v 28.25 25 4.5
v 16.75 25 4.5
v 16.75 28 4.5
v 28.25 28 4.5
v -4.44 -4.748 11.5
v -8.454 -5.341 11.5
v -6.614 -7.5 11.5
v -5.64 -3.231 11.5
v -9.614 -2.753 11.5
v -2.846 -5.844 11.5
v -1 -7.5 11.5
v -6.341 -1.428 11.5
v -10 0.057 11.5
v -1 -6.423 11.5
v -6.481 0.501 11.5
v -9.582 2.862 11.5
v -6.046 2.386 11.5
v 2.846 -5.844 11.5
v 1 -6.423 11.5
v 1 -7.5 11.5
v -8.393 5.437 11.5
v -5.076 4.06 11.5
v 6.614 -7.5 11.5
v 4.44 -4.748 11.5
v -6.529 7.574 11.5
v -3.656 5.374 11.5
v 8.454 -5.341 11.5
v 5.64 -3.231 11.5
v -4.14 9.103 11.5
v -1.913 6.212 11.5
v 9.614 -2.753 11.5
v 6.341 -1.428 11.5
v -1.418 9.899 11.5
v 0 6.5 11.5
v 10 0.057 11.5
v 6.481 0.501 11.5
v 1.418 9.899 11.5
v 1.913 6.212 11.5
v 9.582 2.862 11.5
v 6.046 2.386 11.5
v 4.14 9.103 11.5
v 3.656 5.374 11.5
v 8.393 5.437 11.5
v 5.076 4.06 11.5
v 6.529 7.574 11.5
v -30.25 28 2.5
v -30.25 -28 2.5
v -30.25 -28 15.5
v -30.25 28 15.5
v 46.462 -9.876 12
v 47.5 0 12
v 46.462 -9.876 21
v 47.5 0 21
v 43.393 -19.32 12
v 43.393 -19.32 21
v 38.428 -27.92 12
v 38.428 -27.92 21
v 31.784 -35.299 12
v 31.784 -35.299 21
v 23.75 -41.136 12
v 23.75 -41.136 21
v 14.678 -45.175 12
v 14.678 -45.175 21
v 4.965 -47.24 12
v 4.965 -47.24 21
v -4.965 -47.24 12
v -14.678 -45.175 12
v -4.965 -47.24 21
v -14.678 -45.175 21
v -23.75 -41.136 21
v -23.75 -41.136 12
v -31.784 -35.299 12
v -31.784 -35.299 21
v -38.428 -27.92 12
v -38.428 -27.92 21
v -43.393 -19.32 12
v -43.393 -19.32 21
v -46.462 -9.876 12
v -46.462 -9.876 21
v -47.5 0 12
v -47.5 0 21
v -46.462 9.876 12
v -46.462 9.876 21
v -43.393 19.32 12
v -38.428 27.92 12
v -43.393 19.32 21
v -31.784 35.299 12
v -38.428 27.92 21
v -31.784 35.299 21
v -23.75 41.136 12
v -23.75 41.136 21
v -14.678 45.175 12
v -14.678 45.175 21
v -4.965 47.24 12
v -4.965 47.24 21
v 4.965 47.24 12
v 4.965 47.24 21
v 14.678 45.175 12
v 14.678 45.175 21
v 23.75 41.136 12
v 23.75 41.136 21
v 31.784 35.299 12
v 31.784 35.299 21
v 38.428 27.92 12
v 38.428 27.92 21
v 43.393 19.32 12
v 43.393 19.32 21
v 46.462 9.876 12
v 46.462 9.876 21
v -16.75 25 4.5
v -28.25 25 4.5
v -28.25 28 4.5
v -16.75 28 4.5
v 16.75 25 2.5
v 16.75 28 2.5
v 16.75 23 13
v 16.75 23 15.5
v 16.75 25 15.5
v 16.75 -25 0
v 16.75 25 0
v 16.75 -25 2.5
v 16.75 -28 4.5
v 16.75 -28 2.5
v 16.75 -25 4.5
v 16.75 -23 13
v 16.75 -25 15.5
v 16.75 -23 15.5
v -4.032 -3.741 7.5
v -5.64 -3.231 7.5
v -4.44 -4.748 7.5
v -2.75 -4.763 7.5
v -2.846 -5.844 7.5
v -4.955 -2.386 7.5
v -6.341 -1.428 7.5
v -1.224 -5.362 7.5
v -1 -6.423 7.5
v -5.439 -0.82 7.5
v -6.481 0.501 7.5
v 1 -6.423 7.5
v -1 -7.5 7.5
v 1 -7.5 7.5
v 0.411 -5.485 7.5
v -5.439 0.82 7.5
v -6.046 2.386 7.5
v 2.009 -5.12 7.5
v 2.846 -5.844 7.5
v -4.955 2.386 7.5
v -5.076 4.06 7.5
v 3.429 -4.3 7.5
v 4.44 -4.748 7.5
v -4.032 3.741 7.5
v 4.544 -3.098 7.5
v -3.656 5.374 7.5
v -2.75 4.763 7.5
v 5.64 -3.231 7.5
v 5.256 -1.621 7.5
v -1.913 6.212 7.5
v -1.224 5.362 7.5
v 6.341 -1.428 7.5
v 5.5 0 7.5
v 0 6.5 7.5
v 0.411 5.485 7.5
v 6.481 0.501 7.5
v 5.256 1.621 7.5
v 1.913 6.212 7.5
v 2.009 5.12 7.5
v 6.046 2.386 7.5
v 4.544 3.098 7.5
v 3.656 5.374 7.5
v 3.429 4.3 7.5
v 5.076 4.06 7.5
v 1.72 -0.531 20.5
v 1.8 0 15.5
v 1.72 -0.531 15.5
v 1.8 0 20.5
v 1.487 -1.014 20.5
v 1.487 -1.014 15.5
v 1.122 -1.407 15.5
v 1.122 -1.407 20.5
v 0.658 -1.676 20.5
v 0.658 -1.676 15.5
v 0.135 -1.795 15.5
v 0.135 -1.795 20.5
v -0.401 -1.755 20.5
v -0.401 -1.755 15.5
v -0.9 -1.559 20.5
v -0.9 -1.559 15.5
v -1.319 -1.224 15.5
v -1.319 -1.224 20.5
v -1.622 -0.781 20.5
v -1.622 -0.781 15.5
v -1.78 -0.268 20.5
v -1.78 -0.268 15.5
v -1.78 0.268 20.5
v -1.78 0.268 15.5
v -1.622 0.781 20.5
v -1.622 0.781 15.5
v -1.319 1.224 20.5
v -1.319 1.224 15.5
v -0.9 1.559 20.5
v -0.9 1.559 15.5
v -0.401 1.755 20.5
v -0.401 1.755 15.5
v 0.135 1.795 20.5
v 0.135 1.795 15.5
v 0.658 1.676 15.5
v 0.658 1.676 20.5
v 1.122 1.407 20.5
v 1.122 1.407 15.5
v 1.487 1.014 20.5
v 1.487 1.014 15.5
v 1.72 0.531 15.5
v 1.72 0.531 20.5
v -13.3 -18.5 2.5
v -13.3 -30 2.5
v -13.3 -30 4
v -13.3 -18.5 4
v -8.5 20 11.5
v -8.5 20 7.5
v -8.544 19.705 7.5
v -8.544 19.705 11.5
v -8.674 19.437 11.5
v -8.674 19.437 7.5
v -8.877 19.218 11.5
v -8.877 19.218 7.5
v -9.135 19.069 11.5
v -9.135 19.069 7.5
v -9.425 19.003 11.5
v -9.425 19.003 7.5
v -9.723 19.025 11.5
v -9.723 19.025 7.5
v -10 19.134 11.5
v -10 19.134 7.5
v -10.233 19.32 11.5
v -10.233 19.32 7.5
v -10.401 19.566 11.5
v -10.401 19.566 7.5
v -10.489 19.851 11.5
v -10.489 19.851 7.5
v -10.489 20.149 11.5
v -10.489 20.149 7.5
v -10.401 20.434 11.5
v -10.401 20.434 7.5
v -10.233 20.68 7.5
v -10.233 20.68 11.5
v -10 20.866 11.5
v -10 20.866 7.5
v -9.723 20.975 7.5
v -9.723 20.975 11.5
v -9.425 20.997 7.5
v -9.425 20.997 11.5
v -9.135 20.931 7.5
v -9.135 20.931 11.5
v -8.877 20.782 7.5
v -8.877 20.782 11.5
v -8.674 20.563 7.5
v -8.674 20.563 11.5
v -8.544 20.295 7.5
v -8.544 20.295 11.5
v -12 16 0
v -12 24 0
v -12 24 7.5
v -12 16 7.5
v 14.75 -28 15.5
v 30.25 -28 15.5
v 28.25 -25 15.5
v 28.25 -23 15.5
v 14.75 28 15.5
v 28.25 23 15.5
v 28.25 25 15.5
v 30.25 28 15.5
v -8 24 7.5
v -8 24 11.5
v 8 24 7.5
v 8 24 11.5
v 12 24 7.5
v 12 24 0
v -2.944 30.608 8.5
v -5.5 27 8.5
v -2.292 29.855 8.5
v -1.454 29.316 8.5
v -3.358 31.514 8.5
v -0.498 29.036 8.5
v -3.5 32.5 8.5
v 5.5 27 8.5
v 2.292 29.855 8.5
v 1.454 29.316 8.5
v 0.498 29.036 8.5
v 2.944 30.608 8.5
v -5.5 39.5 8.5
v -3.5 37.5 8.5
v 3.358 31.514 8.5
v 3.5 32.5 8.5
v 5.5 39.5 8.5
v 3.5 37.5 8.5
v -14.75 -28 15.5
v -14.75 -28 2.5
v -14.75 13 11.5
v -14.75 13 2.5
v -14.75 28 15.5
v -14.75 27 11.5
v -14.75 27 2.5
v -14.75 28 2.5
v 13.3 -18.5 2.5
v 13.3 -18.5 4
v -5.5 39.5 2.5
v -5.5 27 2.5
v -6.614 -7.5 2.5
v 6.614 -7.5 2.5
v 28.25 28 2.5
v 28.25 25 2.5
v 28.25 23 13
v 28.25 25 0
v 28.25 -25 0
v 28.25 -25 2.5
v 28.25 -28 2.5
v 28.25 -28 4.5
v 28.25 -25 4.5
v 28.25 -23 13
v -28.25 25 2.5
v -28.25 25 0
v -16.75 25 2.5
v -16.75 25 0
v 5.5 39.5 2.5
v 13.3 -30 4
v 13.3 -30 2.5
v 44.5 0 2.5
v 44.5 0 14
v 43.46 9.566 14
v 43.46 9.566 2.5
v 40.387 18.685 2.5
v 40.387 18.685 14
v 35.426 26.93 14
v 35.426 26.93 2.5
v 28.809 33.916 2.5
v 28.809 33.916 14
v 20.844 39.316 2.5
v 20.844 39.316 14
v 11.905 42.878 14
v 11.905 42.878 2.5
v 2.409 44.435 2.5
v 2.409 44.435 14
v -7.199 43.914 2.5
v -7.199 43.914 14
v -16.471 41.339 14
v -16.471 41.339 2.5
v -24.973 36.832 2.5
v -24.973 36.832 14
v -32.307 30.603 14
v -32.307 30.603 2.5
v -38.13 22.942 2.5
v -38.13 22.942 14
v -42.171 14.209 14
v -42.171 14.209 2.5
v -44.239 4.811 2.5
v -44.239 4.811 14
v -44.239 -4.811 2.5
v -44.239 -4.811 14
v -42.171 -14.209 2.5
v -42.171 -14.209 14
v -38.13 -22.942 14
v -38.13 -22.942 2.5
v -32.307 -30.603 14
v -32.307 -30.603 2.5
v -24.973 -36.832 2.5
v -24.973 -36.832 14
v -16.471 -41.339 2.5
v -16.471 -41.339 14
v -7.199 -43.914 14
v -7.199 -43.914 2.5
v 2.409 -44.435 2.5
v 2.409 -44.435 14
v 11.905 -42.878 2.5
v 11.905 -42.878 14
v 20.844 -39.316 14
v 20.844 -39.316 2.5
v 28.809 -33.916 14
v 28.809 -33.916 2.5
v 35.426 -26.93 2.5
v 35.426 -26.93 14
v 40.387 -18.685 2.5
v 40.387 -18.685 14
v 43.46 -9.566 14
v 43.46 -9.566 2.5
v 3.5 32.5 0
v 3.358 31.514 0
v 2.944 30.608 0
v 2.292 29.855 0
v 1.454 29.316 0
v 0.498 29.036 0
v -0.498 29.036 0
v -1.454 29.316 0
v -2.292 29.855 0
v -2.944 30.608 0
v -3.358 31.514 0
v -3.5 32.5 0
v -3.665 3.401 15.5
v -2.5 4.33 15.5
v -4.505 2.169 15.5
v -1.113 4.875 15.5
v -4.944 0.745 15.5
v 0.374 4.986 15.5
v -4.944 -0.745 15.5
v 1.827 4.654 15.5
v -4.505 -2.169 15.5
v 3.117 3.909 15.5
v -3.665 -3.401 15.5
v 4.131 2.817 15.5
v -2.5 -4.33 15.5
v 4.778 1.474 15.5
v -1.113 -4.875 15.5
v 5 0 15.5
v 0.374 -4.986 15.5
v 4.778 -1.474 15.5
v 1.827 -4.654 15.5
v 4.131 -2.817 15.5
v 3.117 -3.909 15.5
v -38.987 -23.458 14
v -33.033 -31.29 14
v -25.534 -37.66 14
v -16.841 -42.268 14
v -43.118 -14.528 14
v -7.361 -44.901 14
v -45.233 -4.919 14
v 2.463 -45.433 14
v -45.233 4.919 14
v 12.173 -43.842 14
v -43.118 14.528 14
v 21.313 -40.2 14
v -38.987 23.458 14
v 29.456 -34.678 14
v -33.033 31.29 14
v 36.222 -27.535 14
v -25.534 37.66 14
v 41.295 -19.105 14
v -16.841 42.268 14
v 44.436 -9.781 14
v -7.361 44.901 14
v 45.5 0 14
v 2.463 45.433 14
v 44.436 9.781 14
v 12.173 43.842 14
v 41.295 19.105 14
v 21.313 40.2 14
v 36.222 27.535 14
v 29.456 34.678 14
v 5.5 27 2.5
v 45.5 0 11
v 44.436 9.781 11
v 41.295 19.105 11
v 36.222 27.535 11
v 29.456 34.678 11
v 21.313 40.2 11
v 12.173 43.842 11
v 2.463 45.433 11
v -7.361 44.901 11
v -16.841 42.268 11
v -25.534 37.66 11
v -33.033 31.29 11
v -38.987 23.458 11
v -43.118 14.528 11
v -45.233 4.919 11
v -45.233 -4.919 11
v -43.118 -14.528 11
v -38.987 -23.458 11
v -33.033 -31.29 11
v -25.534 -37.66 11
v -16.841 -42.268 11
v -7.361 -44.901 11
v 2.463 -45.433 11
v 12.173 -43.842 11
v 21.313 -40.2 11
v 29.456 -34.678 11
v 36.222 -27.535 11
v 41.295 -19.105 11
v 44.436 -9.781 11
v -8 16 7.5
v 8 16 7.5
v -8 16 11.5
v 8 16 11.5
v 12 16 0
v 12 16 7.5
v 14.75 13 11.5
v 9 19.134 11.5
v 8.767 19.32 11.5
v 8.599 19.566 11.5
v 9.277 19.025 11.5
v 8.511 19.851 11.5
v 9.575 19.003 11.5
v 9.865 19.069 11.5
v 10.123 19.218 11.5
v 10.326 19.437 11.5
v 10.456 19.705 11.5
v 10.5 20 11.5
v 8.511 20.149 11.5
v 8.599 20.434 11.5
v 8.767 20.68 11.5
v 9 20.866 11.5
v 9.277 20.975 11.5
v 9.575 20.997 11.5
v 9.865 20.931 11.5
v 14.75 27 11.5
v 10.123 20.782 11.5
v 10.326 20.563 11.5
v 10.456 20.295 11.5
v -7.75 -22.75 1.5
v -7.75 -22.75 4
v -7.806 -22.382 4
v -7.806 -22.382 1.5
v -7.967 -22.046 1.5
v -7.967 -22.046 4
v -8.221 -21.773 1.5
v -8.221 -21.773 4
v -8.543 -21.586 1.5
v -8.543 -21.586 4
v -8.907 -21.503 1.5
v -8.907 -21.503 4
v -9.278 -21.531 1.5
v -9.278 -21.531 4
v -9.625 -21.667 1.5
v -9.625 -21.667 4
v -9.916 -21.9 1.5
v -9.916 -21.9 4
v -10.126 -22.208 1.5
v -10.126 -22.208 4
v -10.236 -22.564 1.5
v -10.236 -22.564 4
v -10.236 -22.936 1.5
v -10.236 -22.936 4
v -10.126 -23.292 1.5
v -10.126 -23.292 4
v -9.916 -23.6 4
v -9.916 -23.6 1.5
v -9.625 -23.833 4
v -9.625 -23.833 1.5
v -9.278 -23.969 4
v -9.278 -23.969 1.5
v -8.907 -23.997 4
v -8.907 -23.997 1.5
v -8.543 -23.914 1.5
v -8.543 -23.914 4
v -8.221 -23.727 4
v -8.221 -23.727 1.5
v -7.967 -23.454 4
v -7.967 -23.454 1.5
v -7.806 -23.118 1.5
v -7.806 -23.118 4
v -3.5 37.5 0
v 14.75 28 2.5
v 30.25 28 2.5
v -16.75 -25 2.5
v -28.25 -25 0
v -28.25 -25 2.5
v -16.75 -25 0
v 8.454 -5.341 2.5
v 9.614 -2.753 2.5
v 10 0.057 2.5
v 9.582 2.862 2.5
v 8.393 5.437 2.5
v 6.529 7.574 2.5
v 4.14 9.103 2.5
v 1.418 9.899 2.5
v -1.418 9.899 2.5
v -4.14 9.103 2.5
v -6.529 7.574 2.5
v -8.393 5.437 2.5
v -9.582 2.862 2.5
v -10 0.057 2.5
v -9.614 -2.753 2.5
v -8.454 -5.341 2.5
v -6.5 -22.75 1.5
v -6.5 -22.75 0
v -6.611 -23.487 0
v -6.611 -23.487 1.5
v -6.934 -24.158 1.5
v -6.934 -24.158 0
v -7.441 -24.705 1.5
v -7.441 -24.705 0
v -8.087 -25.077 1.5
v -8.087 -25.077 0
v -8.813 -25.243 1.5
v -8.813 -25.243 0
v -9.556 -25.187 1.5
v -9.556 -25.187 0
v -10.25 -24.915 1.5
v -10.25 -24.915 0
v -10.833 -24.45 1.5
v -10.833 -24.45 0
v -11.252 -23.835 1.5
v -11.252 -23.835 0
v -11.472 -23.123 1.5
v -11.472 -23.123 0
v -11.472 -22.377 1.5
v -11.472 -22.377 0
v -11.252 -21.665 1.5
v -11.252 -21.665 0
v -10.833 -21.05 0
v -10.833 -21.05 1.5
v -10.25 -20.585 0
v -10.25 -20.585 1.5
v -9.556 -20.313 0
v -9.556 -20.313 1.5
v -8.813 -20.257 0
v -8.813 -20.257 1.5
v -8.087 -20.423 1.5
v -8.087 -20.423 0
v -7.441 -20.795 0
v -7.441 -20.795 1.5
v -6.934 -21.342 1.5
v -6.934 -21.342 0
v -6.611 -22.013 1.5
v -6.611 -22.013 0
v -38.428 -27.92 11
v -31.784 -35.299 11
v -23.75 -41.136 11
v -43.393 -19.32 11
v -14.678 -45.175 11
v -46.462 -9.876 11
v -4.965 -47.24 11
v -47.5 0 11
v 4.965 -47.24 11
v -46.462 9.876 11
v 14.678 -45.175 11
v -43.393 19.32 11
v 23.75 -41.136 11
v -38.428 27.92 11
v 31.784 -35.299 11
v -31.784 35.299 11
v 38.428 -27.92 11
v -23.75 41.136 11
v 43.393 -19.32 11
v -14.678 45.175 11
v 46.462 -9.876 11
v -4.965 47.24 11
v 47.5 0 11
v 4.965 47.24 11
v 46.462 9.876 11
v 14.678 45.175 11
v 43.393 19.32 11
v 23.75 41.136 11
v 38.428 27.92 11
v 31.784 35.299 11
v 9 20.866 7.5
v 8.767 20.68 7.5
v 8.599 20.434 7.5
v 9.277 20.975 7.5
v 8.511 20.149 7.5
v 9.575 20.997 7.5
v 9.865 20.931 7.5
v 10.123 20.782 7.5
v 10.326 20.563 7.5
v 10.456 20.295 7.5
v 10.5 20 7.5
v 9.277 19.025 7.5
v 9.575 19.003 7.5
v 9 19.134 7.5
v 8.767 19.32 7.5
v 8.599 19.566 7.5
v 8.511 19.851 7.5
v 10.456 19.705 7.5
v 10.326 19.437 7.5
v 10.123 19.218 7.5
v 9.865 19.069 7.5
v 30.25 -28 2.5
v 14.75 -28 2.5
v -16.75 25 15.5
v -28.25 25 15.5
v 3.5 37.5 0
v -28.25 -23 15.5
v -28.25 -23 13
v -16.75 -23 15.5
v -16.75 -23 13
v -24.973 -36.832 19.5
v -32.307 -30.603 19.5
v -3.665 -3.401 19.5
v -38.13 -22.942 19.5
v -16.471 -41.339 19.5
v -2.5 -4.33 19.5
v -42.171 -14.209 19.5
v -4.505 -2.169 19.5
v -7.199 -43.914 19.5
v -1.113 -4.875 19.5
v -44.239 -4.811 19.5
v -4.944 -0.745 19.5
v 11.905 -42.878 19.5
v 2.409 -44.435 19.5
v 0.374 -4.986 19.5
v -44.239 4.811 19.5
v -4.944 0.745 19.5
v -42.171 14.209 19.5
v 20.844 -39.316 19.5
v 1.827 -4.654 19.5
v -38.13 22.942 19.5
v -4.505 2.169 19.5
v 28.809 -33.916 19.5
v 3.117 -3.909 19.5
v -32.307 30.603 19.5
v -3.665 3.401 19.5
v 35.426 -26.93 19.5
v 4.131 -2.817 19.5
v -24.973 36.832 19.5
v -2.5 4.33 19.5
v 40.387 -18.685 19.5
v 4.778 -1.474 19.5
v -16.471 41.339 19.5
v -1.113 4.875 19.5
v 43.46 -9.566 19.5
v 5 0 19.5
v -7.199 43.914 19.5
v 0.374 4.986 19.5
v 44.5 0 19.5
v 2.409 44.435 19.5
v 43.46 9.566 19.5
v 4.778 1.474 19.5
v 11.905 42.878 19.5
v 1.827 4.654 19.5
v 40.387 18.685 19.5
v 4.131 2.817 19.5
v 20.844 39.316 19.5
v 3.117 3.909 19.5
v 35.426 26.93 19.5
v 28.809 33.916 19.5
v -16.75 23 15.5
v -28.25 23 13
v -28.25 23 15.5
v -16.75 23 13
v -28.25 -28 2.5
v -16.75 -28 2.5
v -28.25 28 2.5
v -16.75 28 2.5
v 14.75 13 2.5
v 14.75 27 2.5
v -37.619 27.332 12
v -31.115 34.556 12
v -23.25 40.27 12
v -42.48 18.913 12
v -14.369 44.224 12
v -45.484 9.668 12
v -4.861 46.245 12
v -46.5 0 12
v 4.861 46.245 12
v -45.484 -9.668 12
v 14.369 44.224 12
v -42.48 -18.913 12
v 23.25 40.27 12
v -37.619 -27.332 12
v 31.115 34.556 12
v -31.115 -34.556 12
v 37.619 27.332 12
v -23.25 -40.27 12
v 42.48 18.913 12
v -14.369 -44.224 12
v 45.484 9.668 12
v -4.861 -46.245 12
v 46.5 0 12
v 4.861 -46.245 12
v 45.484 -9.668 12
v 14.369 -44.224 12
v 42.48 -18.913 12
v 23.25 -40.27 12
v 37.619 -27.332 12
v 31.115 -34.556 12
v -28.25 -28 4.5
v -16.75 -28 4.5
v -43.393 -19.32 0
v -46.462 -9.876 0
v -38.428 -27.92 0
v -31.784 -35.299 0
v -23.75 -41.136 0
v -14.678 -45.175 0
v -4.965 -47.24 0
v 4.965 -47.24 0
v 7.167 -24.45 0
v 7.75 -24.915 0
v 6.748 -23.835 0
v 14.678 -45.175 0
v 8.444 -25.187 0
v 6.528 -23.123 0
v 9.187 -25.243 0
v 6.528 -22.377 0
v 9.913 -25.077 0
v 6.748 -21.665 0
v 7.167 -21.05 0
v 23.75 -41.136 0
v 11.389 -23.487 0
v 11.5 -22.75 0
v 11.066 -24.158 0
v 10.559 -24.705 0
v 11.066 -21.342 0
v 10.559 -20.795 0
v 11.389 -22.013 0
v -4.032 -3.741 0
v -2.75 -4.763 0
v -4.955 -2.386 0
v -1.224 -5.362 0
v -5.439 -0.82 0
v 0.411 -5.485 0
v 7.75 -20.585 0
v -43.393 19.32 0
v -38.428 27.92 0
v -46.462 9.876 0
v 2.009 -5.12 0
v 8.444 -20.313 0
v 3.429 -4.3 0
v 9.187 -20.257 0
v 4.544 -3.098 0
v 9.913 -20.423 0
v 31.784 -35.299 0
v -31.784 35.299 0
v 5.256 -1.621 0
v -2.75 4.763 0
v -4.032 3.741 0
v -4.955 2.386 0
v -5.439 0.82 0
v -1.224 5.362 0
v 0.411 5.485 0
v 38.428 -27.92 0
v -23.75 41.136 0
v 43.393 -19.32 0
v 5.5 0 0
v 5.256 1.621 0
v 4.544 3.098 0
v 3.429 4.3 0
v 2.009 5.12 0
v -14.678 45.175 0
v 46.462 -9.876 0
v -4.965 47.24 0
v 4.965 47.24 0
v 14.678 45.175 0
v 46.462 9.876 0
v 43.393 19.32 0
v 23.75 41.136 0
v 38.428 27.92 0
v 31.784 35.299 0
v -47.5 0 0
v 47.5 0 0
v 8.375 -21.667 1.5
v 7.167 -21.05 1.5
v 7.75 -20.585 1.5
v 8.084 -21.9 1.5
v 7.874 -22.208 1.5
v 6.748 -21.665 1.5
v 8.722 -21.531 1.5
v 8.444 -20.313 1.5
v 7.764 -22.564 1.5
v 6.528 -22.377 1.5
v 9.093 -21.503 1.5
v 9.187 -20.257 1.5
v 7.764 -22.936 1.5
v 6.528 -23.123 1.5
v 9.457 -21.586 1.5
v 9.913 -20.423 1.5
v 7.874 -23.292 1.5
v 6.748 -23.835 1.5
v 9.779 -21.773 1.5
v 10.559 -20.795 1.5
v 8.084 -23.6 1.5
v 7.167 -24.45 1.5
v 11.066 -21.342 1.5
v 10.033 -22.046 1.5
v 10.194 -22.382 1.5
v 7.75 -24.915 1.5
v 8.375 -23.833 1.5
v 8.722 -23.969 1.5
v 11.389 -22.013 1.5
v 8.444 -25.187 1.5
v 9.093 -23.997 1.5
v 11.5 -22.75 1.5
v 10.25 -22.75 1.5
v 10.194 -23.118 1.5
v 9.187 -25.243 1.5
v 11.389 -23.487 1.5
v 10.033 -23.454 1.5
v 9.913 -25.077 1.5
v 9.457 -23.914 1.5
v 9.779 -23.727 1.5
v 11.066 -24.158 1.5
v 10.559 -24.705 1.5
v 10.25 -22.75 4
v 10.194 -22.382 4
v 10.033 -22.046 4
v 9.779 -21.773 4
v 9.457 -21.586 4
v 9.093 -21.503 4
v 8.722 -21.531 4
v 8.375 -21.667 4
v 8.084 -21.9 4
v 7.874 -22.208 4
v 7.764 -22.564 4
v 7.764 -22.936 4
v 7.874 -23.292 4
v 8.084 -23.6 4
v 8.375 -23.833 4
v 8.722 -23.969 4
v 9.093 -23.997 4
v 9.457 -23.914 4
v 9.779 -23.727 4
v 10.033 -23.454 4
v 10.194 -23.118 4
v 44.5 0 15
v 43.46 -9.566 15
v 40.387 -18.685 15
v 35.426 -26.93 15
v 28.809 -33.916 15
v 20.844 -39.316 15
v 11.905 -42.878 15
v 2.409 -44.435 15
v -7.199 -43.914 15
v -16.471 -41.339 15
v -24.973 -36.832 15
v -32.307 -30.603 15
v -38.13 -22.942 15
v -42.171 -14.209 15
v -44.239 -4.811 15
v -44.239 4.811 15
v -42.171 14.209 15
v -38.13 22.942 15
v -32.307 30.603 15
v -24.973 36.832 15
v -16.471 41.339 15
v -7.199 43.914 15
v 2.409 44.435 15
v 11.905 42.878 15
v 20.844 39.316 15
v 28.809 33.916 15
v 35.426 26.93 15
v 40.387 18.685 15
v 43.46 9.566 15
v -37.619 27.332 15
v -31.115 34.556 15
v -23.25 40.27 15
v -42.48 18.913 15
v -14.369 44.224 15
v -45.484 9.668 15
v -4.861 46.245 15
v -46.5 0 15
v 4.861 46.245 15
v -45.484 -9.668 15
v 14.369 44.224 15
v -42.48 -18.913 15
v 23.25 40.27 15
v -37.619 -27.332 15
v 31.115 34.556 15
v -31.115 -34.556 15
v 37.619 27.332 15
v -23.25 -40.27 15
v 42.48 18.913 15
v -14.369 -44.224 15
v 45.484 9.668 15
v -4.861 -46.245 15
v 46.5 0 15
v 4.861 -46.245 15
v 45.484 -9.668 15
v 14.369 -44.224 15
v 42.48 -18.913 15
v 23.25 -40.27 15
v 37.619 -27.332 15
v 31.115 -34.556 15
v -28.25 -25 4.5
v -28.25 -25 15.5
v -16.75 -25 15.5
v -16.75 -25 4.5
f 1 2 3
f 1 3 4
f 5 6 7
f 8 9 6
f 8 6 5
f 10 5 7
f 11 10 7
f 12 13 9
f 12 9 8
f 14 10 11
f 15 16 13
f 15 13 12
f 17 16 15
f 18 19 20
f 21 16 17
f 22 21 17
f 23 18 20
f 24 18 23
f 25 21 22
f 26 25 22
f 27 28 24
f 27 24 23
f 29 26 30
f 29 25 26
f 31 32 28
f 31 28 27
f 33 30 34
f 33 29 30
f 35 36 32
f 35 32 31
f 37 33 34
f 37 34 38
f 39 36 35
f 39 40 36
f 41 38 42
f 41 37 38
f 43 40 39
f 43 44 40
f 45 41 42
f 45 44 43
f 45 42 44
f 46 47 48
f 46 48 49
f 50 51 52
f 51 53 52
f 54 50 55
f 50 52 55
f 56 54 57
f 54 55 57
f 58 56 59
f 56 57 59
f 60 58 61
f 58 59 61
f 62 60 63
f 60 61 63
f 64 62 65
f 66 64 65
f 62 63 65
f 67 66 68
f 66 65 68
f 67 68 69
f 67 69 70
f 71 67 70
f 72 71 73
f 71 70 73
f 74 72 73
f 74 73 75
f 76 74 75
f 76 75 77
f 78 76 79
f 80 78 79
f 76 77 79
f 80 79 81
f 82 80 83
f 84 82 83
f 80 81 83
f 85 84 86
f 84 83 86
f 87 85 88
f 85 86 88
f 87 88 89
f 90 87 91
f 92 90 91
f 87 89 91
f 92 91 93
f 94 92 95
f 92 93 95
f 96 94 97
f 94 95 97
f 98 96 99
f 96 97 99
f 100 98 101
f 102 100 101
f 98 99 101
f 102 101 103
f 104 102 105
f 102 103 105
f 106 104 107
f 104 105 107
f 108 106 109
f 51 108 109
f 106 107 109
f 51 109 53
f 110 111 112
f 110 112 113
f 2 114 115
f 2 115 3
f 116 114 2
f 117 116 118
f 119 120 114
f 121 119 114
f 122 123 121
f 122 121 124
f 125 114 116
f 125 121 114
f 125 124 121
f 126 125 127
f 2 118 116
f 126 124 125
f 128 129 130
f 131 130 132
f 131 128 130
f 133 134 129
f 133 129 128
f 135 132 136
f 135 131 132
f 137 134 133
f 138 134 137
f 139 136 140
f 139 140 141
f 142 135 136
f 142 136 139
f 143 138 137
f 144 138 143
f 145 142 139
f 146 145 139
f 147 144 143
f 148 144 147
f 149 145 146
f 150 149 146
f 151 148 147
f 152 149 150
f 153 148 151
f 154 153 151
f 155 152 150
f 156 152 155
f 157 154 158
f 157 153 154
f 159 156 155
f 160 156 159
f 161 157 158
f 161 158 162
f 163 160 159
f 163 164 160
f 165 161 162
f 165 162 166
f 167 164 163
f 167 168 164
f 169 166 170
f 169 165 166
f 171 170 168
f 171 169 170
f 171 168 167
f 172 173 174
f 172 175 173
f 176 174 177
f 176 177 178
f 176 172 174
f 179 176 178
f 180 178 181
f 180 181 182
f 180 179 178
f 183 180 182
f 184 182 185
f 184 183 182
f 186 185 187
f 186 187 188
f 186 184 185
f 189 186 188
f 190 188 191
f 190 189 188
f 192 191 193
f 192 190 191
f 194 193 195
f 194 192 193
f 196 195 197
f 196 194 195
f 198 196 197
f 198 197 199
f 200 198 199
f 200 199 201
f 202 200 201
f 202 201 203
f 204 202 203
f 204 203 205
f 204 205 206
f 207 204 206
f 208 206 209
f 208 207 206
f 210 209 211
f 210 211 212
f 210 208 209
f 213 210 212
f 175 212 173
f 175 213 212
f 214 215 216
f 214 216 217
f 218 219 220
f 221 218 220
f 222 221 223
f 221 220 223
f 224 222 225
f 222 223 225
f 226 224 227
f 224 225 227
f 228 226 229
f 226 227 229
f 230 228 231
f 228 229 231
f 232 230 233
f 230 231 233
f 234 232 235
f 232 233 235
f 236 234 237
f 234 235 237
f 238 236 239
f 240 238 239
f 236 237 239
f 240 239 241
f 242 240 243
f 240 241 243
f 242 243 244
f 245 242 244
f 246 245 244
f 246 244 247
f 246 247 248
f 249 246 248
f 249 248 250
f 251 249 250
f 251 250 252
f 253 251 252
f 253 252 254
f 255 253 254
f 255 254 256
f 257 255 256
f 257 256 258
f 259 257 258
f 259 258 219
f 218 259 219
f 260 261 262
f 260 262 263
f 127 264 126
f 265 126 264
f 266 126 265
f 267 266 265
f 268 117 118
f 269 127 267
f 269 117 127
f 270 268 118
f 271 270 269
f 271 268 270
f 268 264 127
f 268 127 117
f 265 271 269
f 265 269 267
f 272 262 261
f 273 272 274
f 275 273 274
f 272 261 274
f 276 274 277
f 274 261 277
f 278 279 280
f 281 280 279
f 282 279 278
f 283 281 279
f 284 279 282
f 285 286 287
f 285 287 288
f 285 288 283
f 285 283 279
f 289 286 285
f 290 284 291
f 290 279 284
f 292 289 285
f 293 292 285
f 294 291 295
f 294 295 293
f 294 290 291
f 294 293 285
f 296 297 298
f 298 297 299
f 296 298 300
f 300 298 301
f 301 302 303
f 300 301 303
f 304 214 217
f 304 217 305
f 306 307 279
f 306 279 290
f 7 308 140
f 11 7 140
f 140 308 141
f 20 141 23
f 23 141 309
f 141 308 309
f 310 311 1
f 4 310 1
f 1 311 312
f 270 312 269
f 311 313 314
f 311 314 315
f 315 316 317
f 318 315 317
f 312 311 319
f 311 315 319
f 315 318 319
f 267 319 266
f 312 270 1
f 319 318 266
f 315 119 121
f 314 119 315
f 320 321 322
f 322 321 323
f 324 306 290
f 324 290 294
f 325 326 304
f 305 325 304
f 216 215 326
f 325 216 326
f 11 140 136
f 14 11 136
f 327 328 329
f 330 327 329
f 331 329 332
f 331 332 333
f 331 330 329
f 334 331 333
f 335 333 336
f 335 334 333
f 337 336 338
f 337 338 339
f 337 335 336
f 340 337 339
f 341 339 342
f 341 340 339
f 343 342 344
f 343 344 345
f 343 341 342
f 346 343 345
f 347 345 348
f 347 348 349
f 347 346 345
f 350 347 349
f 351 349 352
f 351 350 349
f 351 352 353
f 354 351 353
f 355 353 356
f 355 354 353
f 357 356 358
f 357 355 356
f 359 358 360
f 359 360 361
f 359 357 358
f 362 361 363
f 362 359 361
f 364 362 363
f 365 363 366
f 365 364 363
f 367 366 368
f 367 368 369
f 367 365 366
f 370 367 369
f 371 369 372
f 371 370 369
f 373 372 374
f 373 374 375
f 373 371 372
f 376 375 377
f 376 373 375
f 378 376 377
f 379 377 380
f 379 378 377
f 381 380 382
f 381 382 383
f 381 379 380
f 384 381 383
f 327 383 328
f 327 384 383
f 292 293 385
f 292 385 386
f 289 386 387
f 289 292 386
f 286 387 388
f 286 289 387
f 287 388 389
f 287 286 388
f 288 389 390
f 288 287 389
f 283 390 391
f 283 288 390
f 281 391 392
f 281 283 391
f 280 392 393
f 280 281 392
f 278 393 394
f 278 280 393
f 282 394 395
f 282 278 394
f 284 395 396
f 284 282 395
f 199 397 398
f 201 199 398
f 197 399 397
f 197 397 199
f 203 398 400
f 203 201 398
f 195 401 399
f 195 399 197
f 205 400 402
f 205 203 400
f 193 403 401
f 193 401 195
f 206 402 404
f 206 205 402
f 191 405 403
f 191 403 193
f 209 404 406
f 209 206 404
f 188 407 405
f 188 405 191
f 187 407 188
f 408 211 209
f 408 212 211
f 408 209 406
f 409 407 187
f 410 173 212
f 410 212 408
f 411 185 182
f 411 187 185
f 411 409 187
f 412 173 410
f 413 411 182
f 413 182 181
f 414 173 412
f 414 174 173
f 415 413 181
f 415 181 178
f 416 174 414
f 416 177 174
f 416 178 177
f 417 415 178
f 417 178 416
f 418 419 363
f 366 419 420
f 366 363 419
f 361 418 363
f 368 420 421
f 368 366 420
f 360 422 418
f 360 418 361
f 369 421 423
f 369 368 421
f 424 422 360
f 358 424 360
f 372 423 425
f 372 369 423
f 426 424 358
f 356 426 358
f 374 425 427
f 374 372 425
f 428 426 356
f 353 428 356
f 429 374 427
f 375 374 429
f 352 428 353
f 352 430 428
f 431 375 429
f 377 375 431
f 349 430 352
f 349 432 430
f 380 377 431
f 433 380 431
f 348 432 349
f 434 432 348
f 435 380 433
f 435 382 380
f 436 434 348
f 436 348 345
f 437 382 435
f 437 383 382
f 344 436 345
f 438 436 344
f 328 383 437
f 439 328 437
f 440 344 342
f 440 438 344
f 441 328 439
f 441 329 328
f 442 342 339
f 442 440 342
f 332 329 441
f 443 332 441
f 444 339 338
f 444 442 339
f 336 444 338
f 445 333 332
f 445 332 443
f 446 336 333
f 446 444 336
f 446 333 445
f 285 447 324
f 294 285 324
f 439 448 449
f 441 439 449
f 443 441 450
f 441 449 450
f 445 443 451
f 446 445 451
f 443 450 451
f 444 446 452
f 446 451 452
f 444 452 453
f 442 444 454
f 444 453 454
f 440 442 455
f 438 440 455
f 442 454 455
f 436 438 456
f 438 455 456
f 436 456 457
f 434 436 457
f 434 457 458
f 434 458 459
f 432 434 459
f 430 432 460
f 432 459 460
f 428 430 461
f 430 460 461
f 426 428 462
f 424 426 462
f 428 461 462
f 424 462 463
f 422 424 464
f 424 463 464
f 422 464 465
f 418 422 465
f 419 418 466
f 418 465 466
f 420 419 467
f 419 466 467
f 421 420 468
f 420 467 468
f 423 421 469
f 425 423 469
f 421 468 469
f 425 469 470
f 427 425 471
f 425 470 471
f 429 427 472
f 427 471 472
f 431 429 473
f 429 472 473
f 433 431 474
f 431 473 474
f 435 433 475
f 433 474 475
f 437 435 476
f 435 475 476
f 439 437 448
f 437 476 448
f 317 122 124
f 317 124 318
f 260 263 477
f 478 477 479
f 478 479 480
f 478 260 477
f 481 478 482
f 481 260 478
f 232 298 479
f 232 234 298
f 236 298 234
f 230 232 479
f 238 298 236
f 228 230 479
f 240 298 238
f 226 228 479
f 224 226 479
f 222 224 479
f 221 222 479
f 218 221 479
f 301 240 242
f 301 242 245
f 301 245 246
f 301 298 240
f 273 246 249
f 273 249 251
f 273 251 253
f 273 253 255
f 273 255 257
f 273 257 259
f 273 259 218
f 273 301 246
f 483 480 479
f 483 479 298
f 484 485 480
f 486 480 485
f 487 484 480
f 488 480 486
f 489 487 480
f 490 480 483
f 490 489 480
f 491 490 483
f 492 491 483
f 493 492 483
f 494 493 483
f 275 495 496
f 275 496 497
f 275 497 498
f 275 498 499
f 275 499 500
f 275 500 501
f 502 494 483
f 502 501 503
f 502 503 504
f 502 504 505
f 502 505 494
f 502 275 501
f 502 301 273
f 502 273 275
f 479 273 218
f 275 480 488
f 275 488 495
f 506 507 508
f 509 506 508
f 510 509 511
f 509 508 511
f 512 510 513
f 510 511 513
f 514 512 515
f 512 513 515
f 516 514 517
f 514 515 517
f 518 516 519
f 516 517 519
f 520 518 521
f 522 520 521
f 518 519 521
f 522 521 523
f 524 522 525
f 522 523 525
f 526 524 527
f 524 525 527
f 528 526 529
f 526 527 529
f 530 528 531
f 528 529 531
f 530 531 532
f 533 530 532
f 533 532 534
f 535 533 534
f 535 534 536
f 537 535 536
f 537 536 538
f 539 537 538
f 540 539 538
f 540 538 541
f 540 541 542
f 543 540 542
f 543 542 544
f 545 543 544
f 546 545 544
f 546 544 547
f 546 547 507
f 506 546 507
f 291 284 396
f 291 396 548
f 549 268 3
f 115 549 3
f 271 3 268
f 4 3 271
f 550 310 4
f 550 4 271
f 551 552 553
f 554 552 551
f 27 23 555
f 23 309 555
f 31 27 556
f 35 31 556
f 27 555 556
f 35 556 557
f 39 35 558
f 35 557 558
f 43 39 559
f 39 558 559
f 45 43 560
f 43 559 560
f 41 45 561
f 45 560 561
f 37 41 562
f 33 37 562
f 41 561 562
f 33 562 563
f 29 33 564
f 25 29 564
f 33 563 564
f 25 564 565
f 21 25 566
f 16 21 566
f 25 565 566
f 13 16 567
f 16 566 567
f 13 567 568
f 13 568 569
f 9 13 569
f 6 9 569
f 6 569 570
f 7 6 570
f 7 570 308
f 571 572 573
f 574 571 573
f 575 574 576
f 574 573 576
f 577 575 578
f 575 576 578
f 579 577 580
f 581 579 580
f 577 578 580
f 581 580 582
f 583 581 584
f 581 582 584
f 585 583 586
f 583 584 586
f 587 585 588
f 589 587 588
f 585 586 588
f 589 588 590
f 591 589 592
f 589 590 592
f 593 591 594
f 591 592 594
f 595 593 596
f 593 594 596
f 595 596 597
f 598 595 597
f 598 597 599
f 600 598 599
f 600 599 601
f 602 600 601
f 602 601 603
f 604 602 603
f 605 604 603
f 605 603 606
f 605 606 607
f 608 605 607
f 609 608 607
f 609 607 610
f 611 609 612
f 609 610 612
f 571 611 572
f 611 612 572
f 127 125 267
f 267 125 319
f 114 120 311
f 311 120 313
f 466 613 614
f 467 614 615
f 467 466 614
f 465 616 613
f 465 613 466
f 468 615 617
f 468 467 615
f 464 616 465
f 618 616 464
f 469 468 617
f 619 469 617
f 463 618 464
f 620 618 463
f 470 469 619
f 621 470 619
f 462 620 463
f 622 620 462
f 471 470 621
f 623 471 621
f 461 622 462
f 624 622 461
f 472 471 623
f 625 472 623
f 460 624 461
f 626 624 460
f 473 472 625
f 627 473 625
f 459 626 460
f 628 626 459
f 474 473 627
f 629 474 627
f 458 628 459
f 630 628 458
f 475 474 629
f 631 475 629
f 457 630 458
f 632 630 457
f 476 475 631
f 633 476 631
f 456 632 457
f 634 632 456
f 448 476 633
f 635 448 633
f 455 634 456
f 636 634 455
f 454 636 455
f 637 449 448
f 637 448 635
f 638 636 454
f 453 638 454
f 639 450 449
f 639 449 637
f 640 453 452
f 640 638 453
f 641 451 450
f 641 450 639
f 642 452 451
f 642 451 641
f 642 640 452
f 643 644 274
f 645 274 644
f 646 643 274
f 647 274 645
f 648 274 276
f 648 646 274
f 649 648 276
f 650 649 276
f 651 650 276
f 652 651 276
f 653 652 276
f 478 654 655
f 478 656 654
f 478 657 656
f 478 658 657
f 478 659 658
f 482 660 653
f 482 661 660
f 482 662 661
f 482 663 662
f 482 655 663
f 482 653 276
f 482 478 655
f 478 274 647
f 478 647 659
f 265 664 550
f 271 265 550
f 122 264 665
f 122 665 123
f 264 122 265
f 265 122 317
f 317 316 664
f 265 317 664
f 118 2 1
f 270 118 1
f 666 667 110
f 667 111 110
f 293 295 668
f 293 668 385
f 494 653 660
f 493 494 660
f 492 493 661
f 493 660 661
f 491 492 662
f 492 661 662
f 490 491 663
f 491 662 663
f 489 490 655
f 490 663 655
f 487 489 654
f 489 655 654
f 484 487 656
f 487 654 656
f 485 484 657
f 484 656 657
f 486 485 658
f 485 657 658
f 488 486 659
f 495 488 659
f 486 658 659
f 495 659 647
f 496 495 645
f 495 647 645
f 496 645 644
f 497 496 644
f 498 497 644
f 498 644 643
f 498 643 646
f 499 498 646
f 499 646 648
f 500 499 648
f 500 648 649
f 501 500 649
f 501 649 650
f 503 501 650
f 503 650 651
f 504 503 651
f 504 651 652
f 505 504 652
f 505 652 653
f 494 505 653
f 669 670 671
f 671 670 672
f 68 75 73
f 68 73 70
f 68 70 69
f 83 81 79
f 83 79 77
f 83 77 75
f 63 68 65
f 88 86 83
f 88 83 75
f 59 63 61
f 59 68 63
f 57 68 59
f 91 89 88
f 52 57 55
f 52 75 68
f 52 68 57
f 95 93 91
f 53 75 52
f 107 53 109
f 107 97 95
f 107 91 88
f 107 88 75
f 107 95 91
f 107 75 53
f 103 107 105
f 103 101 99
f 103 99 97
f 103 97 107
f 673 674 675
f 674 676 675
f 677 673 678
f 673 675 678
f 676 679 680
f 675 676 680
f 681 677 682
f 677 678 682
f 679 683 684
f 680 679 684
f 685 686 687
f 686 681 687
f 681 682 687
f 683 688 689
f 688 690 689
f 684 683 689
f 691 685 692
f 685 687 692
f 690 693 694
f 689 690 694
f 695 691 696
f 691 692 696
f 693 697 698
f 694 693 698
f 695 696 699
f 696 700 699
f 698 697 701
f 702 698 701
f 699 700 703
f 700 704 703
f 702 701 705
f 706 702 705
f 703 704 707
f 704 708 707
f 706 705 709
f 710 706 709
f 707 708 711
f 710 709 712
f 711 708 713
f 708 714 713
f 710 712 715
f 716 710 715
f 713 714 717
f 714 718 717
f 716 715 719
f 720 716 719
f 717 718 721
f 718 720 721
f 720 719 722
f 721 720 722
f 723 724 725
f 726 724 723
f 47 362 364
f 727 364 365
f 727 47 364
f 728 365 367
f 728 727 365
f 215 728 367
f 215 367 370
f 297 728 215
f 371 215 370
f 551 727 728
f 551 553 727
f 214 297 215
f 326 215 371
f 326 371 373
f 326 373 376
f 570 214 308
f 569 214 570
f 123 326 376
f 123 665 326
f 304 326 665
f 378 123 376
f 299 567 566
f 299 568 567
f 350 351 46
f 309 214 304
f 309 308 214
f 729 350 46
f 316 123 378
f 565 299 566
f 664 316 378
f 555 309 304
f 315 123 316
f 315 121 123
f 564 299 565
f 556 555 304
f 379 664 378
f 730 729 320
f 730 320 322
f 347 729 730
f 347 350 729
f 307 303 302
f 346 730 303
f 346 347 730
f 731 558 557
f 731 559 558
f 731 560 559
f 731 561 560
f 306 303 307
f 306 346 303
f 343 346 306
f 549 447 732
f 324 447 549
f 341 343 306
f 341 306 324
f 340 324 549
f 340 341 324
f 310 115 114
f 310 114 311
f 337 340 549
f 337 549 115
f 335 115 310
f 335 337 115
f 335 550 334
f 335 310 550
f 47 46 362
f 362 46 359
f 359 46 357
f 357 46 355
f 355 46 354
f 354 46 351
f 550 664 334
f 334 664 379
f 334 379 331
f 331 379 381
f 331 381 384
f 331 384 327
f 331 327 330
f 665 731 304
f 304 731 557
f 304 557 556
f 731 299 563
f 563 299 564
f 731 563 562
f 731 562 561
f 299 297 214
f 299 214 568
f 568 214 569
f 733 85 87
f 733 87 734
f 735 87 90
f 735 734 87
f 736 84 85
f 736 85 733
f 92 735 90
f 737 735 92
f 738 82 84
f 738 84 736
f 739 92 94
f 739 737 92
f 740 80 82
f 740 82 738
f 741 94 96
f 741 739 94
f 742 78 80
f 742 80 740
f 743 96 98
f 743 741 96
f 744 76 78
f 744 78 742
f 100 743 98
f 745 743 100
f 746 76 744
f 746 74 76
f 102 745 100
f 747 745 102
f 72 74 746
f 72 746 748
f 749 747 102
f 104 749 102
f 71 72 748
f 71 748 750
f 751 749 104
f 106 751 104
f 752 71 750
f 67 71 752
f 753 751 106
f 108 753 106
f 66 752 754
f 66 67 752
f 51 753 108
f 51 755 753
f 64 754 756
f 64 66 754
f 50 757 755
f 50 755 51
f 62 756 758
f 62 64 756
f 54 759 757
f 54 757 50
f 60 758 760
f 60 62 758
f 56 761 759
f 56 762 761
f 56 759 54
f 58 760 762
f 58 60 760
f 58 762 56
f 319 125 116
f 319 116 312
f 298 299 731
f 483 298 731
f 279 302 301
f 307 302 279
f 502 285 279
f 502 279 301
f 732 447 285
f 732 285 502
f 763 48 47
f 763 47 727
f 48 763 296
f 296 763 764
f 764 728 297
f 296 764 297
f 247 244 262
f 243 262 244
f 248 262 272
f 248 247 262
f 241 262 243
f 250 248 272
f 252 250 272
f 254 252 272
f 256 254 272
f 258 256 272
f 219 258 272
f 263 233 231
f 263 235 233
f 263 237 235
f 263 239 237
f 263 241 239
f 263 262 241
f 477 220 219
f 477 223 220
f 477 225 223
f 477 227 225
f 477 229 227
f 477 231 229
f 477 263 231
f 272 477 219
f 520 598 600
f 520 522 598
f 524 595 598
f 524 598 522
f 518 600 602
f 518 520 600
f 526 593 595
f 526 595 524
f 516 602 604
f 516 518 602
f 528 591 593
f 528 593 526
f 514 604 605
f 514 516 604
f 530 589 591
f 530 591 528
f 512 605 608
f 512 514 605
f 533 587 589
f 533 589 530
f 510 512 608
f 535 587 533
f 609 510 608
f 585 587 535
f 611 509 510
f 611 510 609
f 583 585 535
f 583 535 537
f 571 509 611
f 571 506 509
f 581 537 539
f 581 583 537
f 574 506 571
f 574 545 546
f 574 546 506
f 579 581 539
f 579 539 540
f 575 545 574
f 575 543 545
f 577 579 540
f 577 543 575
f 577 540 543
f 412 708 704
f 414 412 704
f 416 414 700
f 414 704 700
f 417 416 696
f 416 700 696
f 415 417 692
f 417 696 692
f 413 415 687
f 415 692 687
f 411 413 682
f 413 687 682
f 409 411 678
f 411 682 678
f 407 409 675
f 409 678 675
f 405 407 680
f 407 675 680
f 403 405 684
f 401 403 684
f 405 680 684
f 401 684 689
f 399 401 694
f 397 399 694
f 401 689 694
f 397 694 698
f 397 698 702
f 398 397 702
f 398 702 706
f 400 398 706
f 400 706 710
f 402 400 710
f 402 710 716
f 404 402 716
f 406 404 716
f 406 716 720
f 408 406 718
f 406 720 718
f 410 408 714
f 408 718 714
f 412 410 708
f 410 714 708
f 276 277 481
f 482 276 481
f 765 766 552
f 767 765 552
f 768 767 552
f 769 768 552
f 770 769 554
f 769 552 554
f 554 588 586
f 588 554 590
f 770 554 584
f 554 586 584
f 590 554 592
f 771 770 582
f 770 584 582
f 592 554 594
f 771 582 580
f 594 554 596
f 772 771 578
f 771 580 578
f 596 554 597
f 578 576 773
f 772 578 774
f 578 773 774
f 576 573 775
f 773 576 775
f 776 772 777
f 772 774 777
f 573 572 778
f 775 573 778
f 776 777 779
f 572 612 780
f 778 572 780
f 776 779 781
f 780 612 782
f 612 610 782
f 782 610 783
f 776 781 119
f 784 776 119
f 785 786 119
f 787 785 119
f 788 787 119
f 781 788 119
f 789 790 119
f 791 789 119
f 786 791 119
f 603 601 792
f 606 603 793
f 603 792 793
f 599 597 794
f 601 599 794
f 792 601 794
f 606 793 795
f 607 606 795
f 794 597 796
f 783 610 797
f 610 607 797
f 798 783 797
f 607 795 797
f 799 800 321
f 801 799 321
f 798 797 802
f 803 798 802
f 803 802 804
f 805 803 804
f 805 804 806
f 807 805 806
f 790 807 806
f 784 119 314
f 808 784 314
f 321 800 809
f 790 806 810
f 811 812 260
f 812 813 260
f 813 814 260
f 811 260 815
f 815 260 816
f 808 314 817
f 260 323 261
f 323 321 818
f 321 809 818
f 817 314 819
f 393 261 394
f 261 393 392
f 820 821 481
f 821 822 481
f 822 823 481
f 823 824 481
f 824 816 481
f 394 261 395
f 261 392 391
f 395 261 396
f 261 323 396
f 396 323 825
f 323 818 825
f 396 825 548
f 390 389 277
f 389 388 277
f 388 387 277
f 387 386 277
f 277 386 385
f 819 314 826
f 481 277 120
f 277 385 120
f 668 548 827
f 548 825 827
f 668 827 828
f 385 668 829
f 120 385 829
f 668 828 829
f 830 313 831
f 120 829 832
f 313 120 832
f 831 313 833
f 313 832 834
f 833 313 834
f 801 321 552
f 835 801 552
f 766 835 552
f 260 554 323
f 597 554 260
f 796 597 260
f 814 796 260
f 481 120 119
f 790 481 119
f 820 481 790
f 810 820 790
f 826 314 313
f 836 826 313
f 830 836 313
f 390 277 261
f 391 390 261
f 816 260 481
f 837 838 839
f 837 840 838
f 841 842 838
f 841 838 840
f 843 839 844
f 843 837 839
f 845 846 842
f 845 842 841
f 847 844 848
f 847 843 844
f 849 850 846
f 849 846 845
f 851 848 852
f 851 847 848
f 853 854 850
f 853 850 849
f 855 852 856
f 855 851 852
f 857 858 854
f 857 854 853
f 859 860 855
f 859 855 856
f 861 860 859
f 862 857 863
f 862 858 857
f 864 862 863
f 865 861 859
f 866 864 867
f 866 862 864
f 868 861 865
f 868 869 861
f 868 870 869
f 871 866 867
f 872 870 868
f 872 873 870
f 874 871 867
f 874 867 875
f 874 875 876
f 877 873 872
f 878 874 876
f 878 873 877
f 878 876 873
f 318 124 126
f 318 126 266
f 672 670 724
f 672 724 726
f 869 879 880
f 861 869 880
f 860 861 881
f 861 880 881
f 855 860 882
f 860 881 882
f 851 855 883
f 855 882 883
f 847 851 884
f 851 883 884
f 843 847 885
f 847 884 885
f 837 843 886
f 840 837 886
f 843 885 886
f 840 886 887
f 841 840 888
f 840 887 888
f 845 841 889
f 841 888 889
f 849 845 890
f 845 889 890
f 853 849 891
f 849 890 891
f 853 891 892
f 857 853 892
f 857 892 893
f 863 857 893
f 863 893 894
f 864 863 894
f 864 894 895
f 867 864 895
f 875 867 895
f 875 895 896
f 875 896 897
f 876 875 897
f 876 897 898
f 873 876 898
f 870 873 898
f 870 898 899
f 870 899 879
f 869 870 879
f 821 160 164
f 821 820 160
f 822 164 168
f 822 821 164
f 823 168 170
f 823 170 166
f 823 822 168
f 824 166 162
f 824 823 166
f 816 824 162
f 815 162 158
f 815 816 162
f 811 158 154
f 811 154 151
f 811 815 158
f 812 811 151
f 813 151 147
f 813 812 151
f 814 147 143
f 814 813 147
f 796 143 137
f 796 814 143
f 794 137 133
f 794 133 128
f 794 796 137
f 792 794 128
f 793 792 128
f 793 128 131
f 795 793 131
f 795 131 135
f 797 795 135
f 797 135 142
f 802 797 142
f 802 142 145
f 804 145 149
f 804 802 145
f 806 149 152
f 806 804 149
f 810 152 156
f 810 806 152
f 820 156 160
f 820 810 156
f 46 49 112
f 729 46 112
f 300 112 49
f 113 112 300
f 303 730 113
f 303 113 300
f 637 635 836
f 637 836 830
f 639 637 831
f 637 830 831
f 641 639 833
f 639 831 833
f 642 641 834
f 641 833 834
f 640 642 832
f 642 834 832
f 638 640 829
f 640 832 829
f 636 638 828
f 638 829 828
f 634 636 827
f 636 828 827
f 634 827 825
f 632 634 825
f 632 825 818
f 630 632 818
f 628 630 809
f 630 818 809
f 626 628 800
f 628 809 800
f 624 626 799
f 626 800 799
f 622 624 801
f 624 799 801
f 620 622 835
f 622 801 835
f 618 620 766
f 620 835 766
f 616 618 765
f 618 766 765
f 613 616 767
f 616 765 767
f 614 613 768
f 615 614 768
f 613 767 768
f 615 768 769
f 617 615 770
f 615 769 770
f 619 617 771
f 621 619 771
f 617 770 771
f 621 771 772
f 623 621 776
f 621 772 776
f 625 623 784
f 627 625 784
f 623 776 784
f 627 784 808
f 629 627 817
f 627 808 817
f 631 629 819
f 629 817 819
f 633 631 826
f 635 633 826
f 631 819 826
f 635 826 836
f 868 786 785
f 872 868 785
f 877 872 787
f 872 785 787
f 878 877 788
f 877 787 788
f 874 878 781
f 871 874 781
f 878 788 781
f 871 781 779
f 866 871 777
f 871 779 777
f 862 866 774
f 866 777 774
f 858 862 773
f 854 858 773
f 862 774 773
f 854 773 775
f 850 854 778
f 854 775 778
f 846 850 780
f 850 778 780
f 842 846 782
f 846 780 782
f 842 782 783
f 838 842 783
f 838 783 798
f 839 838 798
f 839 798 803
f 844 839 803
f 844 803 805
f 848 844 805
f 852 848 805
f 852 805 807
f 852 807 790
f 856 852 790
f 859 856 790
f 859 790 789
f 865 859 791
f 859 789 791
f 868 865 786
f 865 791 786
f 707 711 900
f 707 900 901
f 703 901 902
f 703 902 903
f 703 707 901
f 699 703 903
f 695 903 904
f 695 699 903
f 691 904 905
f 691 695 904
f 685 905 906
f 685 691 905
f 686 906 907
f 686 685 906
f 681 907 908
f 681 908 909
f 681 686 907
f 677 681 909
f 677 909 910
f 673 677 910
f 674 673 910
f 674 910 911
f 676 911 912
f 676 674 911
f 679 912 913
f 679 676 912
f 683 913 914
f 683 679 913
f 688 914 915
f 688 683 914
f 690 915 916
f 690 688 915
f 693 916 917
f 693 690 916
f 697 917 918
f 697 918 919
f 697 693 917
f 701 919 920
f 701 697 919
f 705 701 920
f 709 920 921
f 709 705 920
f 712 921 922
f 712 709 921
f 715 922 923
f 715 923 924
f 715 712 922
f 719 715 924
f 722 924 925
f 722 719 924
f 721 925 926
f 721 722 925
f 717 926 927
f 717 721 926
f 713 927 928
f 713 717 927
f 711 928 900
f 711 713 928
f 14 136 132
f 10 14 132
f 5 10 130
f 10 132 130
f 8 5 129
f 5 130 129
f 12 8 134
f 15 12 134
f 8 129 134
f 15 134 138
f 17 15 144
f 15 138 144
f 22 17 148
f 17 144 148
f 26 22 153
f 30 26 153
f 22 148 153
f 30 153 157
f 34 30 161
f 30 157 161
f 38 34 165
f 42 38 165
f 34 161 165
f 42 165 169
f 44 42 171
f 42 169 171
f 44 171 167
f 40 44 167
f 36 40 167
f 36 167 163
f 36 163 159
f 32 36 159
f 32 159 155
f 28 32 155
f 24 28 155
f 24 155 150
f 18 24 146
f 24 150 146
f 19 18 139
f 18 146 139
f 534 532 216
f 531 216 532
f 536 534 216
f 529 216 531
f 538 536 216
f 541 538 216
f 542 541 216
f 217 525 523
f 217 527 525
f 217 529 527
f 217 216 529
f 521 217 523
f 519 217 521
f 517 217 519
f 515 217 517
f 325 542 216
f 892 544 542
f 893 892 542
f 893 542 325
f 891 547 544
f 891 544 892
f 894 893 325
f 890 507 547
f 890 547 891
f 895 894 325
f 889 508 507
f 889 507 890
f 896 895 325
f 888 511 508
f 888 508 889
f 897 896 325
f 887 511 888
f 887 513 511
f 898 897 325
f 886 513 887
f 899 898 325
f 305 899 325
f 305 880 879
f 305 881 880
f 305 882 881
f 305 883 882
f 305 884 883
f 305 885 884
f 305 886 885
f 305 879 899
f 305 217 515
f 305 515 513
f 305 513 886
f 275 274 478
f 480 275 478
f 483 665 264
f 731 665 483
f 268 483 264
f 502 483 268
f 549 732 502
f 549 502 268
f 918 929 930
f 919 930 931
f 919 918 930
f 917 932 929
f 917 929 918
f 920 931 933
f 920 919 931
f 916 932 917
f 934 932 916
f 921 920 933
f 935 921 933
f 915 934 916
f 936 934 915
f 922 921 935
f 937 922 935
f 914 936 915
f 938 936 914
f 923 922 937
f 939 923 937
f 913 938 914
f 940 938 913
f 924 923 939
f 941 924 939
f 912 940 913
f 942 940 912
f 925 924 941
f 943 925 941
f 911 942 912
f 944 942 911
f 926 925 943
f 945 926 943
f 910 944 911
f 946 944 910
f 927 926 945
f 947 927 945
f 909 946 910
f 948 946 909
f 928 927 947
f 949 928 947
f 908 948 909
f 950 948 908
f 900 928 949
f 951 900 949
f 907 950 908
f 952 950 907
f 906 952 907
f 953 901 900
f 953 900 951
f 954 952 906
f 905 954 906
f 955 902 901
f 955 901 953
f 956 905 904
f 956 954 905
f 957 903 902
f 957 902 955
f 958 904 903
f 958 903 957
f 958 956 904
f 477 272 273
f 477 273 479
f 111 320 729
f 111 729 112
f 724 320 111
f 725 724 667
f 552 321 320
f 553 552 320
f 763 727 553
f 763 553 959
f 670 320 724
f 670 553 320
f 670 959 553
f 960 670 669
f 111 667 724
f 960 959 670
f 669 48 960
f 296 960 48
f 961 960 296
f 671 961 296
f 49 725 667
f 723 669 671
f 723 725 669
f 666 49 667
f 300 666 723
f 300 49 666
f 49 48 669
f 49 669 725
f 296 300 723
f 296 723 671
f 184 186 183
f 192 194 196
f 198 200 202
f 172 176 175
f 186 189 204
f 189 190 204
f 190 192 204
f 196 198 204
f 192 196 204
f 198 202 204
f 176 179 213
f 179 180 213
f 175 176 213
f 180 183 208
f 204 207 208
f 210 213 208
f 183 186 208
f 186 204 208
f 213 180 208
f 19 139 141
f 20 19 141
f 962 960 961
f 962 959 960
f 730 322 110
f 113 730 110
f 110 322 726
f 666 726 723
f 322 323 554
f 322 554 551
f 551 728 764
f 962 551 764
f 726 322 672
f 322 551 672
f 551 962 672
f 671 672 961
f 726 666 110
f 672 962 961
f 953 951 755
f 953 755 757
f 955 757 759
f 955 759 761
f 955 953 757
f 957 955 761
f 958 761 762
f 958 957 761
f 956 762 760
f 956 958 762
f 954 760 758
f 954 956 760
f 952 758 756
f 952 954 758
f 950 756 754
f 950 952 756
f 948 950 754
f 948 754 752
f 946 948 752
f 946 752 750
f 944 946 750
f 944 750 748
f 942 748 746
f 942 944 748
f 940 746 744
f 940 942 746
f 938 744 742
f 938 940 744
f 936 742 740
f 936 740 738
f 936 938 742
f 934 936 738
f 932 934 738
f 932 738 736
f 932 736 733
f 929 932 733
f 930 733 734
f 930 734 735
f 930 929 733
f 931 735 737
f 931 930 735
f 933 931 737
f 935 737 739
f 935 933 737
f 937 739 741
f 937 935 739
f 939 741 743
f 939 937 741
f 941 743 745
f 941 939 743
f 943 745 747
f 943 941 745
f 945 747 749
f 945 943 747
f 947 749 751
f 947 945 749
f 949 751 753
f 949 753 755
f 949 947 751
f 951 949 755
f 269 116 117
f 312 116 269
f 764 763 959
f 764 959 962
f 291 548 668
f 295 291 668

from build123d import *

# Parameters (mm, degrees)
F0_R      = 47.5
F0_R_2    = 5.5
F1_DEPTH  = 2.5
F2_W      = 26.6
F2_H      = 11.5
F3_DEPTH  = 1.5
F4_R      = 1.25
F5_DEPTH  = 4.001
F6_R      = 5.5
F7_DEPTH  = 5
F9_DEPTH  = 4
F11_W     = 30
F11_H     = 14
F12_DEPTH = 9
F10_W     = 24
F10_H     = 8
F13_DEPTH = 7.5
F14_W     = 16
F14_H     = 8
F14_R     = 1
F15_DEPTH = 4.001
F17_W     = 15.5
F17_H     = 56
F18_DEPTH = 13
F16_W     = 11.5
F16_H     = 50
F19_DEPTH = 13
F21_W     = 11.5
F21_H     = 2
F20_W     = 11.5
F20_H     = 2
F22_DEPTH = 2.501
F23_W     = 11.5
F23_H     = 2
F24_DEPTH = 75.501
F25_W     = 11.5
F25_H     = 2
F26_DEPTH = 75.501
F27_W     = 11
F27_H     = 12.5
F28_DEPTH = 6
F29_DEPTH = 2.501
F30_R     = 47.5
F30_R_2   = 44.5
F31_DEPTH = 8.5
F32_R     = 45.5
F32_R_2   = 44.5
F33_DEPTH = 3
F34_R     = 2.5
F34_R_2   = 1.25
F35_DEPTH = 1.5
F37_R     = 47.5
F38_DEPTH = 1.5
F39_R     = 47.5
F39_R_2   = 44.5
F40_DEPTH = 4.5
F41_R     = 47.5
F41_R_2   = 46.5
F42_DEPTH = 3
F43_R     = 5
F43_R_2   = 1.8
F44_DEPTH = 4
F45_DEPTH = 1


with BuildPart() as f1:
    # F0 (on Top) → F1 (new body)
    with BuildSketch(Plane.XY):
        Circle(F0_R)
        Circle(F0_R_2, mode=Mode.SUBTRACT)
    extrude(amount=F1_DEPTH)

    # F2 (on face) → F3 (join)
    with BuildSketch(Plane.XY.offset(2.5)):
        with Locations((0, -24.25)):
            Rectangle(F2_W, F2_H)
    extrude(amount=F3_DEPTH)

    # F4 (on face) → F5 (cut, through all)
    with BuildSketch(Plane.XY.offset(4)):
        with Locations((-9, -22.75)):
            Circle(F4_R)
        with Locations((9, -22.75)):
            Circle(F4_R)
    extrude(amount=-F5_DEPTH, mode=Mode.SUBTRACT)

    # F6 (on face) → F7 (join)
    with BuildSketch(Plane.XY.offset(2.5)):
        with BuildLine():
            Line((-6.6143782777, -7.5), (6.6143782777, -7.5))
            ThreePointArc((6.6143782777, -7.5), (0, 10), (-6.6143782777, -7.5))
        make_face()
        Circle(F6_R, mode=Mode.SUBTRACT)
    extrude(amount=F7_DEPTH)

    # F8 (on face) → F9 (join)
    with BuildSketch(Plane.XY.offset(7.5)):
        with BuildLine():
            Line((1, -7.5), (6.6143782777, -7.5))
            ThreePointArc((6.6143782777, -7.5), (0, 10), (-6.6143782777, -7.5))
            Line((-6.6143782777, -7.5), (-1, -7.5))
            Line((-1, -7.5), (-1, -6.4226162893))
            ThreePointArc((-1, -6.4226162893), (0, 6.5), (1, -6.4226162893))
            Line((1, -6.4226162893), (1, -7.5))
        make_face()
    extrude(amount=F9_DEPTH)

    # F11 (on face) → F12 (join)
    with BuildSketch(Plane.XY.offset(2.5)):
        with Locations((0, 20)):
            Rectangle(F11_W, F11_H)
    extrude(amount=F12_DEPTH)

    # F10 (on face) → F13 (cut)
    with BuildSketch(Plane(origin=(0, 0, 0), x_dir=(1, 0, 0), z_dir=(0, 0, -1))):
        with Locations((0, -20)):
            Rectangle(F10_W, F10_H)
    extrude(amount=-F13_DEPTH, mode=Mode.SUBTRACT)

    # F14 (on face) → F15 (cut, through all)
    with BuildSketch(Plane(origin=(0, 0, 7.5), x_dir=(1, 0, 0), z_dir=(0, 0, -1))):
        with Locations((0, -20)):
            Rectangle(F14_W, F14_H)
        with Locations((-9.5, -20)):
            Circle(F14_R)
        with Locations((9.5, -20)):
            Circle(F14_R)
    extrude(amount=-F15_DEPTH, mode=Mode.SUBTRACT)

    # F17 (on face) → F18 (join)
    with BuildSketch(Plane.XY.offset(2.5)):
        with Locations((-22.5, 0)):
            Rectangle(F17_W, F17_H)
        with Locations((22.5, 0)):
            Rectangle(F17_W, F17_H)
    extrude(amount=F18_DEPTH)

    # F16 (on face) → F19 (cut)
    with BuildSketch(Plane(origin=(0, 0, 0), x_dir=(1, 0, 0), z_dir=(0, 0, -1))):
        with Locations((-22.5, 0)):
            Rectangle(F16_W, F16_H)
        with Locations((22.5, 0)):
            Rectangle(F16_W, F16_H)
    extrude(amount=-F19_DEPTH, mode=Mode.SUBTRACT)

    # F21 (on face) + F20 (on face) → F22 (cut, through all)
    with BuildSketch(Plane(origin=(0, 0, 13), x_dir=(1, 0, 0), z_dir=(0, 0, -1))):
        with Locations((-22.5, 24)):
            Rectangle(F21_W, F21_H)
        with Locations((-22.5, -24)):
            Rectangle(F21_W, F21_H)
    with BuildSketch(Plane(origin=(0, 0, 13), x_dir=(1, 0, 0), z_dir=(0, 0, -1))):
        with Locations((22.5, -24)):
            Rectangle(F20_W, F20_H)
        with Locations((22.5, 24)):
            Rectangle(F20_W, F20_H)
    extrude(amount=-F22_DEPTH, mode=Mode.SUBTRACT)

    # F23 (on face) → F24 (cut, through all)
    with BuildSketch(Plane.XZ.offset(28)):
        with Locations((22.5, 3.5)):
            Rectangle(F23_W, F23_H)
    extrude(amount=-F24_DEPTH, mode=Mode.SUBTRACT)

    # F25 (on face) → F26 (cut, through all)
    with BuildSketch(Plane.XZ.offset(28)):
        with Locations((-22.5, 3.5)):
            Rectangle(F25_W, F25_H)
    extrude(amount=-F26_DEPTH, mode=Mode.SUBTRACT)

    # F27 (on face) → F28 (join)
    with BuildSketch(Plane.XY.offset(2.5)):
        with Locations((0, 33.25)):
            Rectangle(F27_W, F27_H)
        with BuildLine():
            Line((-3.5, 32.5), (-3.5, 37.5))
            Line((-3.5, 37.5), (3.5, 37.5))
            Line((3.5, 37.5), (3.5, 32.5))
            ThreePointArc((3.5, 32.5), (0, 29), (-3.5, 32.5))
        make_face(mode=Mode.SUBTRACT)
    extrude(amount=F28_DEPTH)

    # F29 (cut, through all): a face of the model
    f29_faces = [f1.faces().sort_by_distance(p)[0] for p in [
        (0, 33.5861765733, 2.5),
    ]]
    extrude(f29_faces, amount=-F29_DEPTH, mode=Mode.SUBTRACT)

    # F30 (on face) → F31 (join)
    with BuildSketch(Plane.XY.offset(2.5)):
        Circle(F30_R)
        Circle(F30_R_2, mode=Mode.SUBTRACT)
    extrude(amount=F31_DEPTH)

    # F32 (on face) → F33 (join)
    with BuildSketch(Plane.XY.offset(11)):
        Circle(F32_R)
        Circle(F32_R_2, mode=Mode.SUBTRACT)
    extrude(amount=F33_DEPTH)

    # F34 (on face) → F35 (cut)
    with BuildSketch(Plane(origin=(0, 0, 0), x_dir=(1, 0, 0), z_dir=(0, 0, -1))):
        with Locations((-9, 22.75)):
            Circle(F34_R)
        with Locations((-9, 22.75)):
            Circle(F34_R_2, mode=Mode.SUBTRACT)
        with Locations((9, 22.75)):
            Circle(F34_R)
        with Locations((9, 22.75)):
            Circle(F34_R_2, mode=Mode.SUBTRACT)
        with Locations((9, 22.75)):
            Circle(F34_R_2)
        with Locations((-9, 22.75)):
            Circle(F34_R_2)
    extrude(amount=-F35_DEPTH, mode=Mode.SUBTRACT)


with BuildPart() as f38:
    # F37 (on offset) → F38 (new body)
    with BuildSketch(Plane.XY.offset(21)):
        Circle(F37_R)
    extrude(amount=-F38_DEPTH)

    # F39 (on face) → F40 (join)
    with BuildSketch(Plane(origin=(0, 0, 19.5), x_dir=(1, 0, 0), z_dir=(0, 0, -1))):
        Circle(F39_R)
        Circle(F39_R_2, mode=Mode.SUBTRACT)
    extrude(amount=F40_DEPTH)

    # F41 (on face) → F42 (join)
    with BuildSketch(Plane(origin=(0, 0, 15), x_dir=(1, 0, 0), z_dir=(0, 0, -1))):
        Circle(F41_R)
        Circle(F41_R_2, mode=Mode.SUBTRACT)
    extrude(amount=F42_DEPTH)

    # F43 (on face) → F44 (join)
    with BuildSketch(Plane(origin=(0, 0, 19.5), x_dir=(1, 0, 0), z_dir=(0, 0, -1))):
        Circle(F43_R)
        Circle(F43_R_2, mode=Mode.SUBTRACT)
    extrude(amount=F44_DEPTH)

    # F45 (cut): a face of the model
    f45_faces = [f38.faces().sort_by_distance(p)[0] for p in [
        (0, 0, 19.5),
    ]]
    extrude(f45_faces, amount=-F45_DEPTH, mode=Mode.SUBTRACT)


solid = Compound([f1.part, f38.part])
